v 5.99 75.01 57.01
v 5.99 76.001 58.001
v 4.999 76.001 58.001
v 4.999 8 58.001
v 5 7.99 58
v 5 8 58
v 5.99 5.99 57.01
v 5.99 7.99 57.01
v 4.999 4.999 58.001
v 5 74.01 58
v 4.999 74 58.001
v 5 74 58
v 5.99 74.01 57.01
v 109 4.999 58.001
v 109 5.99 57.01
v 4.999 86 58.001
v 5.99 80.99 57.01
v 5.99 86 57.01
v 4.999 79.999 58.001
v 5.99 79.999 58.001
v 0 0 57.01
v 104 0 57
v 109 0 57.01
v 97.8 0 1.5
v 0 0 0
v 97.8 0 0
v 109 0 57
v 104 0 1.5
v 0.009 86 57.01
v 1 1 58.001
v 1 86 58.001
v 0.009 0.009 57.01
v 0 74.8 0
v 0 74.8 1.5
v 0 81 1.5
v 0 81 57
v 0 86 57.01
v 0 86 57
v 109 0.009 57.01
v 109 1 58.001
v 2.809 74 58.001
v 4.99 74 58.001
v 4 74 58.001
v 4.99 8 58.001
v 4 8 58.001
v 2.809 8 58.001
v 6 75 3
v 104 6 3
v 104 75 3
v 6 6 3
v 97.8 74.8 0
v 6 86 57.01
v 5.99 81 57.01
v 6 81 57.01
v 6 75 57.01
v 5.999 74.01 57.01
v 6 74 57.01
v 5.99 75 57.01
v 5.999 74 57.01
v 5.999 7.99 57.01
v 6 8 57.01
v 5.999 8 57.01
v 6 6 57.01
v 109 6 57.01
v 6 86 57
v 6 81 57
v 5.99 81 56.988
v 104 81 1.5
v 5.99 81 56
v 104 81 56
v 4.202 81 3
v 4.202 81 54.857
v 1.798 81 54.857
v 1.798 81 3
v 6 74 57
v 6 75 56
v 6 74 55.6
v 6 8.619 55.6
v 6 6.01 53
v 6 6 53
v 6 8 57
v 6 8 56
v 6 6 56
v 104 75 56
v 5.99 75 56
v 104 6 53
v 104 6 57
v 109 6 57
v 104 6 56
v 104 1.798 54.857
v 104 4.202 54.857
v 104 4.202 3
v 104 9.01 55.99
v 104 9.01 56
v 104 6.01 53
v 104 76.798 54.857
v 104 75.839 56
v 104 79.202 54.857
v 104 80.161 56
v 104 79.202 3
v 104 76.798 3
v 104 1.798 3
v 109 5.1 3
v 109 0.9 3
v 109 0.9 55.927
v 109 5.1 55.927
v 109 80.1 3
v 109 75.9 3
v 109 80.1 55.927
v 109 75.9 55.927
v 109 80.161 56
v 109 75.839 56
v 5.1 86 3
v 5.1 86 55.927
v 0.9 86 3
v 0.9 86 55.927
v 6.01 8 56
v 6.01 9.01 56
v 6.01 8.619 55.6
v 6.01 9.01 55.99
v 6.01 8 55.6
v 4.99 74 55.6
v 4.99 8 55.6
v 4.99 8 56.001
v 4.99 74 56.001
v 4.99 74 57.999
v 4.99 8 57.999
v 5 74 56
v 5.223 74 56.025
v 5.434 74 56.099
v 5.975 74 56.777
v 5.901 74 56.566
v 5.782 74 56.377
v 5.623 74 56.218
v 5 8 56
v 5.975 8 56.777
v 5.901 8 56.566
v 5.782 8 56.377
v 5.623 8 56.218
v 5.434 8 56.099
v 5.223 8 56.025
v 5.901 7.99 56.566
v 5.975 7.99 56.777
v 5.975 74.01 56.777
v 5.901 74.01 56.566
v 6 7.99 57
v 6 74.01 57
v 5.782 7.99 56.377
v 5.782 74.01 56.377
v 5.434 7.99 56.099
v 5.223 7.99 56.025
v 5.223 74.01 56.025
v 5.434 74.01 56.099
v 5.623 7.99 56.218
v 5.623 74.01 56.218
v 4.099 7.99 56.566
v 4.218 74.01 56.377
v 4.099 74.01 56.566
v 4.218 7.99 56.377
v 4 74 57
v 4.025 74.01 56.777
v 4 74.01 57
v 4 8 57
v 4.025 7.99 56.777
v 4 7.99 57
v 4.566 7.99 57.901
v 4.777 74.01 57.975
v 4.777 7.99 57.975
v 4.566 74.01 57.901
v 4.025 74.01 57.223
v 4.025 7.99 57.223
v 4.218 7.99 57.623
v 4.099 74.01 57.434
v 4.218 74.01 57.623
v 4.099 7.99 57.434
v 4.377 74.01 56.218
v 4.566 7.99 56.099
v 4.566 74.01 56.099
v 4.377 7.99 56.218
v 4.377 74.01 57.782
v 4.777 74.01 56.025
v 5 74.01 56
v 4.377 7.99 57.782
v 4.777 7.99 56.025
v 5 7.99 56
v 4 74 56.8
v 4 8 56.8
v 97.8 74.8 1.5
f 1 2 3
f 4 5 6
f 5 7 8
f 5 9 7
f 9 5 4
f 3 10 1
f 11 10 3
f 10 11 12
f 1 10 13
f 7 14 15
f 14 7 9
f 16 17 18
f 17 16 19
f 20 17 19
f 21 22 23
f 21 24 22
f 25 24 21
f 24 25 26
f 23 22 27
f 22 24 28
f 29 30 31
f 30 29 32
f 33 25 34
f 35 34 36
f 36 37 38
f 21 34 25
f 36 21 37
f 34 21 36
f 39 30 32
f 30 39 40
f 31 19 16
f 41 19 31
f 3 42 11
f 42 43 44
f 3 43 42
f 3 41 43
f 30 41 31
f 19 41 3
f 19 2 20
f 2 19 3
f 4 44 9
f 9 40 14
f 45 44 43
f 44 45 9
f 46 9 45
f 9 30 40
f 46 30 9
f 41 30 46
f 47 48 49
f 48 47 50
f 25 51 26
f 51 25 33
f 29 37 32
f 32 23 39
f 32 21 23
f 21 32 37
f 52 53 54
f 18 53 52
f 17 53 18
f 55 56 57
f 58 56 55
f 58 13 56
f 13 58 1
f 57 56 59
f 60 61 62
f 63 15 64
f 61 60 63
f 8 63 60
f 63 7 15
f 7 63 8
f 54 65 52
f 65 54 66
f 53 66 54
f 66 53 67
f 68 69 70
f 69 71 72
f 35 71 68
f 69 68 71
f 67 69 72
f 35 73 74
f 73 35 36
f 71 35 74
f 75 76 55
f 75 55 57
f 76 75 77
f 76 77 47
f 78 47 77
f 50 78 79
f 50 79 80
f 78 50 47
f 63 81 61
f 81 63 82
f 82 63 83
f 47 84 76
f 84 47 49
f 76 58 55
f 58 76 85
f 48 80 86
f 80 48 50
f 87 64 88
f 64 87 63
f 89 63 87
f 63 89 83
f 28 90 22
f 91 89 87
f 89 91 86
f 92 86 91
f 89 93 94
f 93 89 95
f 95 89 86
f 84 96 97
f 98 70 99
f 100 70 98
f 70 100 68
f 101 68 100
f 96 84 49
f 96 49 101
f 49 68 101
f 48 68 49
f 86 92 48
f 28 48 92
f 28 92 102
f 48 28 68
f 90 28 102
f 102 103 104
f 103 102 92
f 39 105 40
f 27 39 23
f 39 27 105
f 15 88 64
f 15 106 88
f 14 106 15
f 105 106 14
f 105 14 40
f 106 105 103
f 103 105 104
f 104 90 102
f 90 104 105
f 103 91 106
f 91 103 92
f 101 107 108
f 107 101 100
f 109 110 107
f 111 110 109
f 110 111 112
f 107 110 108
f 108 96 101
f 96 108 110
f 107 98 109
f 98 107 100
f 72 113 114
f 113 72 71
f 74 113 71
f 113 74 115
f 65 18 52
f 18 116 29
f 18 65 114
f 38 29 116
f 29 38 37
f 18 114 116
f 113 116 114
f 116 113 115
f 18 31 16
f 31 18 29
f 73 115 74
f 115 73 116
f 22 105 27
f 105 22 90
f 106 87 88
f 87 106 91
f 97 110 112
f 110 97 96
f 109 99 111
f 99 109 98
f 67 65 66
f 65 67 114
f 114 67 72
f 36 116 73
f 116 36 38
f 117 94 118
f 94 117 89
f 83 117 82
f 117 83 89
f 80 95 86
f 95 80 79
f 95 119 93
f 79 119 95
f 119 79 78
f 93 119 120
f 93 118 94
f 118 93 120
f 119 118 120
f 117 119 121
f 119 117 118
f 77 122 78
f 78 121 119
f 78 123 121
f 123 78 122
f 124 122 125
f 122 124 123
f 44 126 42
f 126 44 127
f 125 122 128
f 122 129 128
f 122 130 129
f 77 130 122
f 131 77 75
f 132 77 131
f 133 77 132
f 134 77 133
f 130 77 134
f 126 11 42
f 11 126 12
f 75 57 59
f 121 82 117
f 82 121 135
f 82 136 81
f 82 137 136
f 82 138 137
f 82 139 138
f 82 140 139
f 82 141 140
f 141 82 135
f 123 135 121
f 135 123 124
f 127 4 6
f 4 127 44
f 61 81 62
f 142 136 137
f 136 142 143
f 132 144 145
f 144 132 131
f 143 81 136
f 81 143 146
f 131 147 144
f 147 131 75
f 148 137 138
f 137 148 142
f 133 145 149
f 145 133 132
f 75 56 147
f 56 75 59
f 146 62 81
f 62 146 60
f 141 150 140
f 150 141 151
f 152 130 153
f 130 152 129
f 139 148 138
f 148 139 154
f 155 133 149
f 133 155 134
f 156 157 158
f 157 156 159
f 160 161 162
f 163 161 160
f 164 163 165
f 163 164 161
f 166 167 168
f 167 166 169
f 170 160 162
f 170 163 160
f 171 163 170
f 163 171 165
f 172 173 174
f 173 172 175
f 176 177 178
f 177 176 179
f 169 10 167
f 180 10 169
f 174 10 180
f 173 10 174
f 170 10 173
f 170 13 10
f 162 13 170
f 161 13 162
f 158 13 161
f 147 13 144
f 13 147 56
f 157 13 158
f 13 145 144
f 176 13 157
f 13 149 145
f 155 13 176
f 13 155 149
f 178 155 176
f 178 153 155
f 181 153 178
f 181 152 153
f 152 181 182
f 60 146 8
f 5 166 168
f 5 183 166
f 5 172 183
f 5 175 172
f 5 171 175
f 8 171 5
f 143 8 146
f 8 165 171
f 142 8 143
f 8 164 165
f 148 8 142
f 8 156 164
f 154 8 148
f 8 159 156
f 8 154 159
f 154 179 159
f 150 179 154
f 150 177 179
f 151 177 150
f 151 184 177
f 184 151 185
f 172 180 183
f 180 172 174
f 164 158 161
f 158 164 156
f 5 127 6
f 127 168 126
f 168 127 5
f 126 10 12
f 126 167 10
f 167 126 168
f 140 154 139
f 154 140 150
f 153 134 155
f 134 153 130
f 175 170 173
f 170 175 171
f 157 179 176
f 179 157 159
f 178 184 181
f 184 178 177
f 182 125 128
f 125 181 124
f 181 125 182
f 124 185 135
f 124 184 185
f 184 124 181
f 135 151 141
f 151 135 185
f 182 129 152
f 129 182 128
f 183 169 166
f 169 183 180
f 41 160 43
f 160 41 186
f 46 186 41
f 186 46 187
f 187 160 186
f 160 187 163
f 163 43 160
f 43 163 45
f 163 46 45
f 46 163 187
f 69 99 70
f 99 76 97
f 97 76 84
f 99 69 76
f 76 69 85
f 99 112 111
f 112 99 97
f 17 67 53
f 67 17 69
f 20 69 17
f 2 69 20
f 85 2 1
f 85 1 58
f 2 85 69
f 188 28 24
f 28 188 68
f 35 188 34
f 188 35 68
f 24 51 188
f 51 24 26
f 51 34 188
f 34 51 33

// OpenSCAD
// ============================================================================
// cutlery_box.scad
// Graduated 3-chamber disposable-cutlery box (Option 3) — CUT-FROM-SOLID port
// of build_box.py, for a 120 x 120 x 120 mm printer (AOSEED).
//
// WHY THIS PORT EXISTS (the whole point):
//   The hand-mesh generator (build_box.py) could not keep the 1 mm rim chamfer
//   continuous across the female dovetail joints, because where a slot's flared
//   corner crosses the sloped chamfer it needs a true boolean intersection.
//   OpenSCAD HAS that boolean kernel, so here we do exactly the "cut-from-solid"
//   thing:
//      1. Build the ENTIRE box as ONE solid, WITH the chamfer already on it.
//      2. difference() out vertical dovetail prisms ( /_\ cross-section ),
//         running from just above the base plate up THROUGH the rim, to both
//         (a) form the sliding-dovetail joints, and
//         (b) split the box into 6 bed-sized pieces.
//   Because the cut is a real boolean through the already-chamfered solid, the
//   sloped chamfer<->slot edge is produced for free => the rim chamfer stays
//   CONTINUOUS across every joint, with none of the sliver hacks.
//
// ----------------------------------------------------------------------------
// HOW TO USE
//   In the app:  set `part` below (or use the Customizer dropdown), F5 to
//                preview, F6 to render, then File > Export > STL.
//   One piece (CLI):
//      openscad -o body_knife_A.stl -D 'part="knife_A"' cutlery_box.scad
//   ALL SIX (bash, run from this folder):
//      for p in knife_A knife_B fork_A fork_B spoon_A spoon_B; do \
//        openscad -o "body_$p.stl" -D "part=\"$p\"" cutlery_box.scad ; done
//   PNG preview of one piece:
//      openscad -o knife_B.png --imgsize=1400,1000 --autocenter --viewall \
//        -D 'part="knife_B"' cutlery_box.scad
//
//   Pieces are modelled in ASSEMBLED coordinates (floor-down, z=0 is the bed),
//   so importing all six STLs together shows the assembled box directly; your
//   slicer will auto-drop each one onto the plate for printing.
//
// BED SANITY: every piece is <= 120 mm in X, Y, Z.
//   Z = 58 mm. Widest piece = spoon at 117 mm (Y). A-halves reach 109 mm (X,
//   including the protruding dovetail key). All under 120.
//
// !! I could NOT run OpenSCAD to verify this file (no binary in my sandbox) !!
//   - The rim chamfer is a SMOOTH, true-45 bevel built from hull() frustums of
//     convex rectangles. Works in every OpenSCAD since ~2015 (incl. Homebrew
//     2021.01). No stepped staircase -- and, crucially, it makes box() a clean
//     well-formed solid so the per-part booleans resolve reliably (the old
//     14-slice staircase was fragile and CGAL was dropping the walls of the
//     interior parts, leaving only the key prisms => "floating boxes").
//   - roof() is still available behind USE_ROOF=true for those who have it
//     (2021.01+ snapshots); for THIS rectangular design it is identical, so it
//     is NOT required.
//   - After F6, check the console for "WARNING"/"not a valid 2-manifold".
//     If a tenon ever looks detached, bump EPS to 0.05.
// ============================================================================


/* [Part to render / export] */
part = "knife_A"; // [knife_A, knife_B, fork_A, fork_B, spoon_A, spoon_B, assembly]

/* [Chamfer method] */
// false = smooth hull() frustum bevel (default, any OpenSCAD); true = roof() (2021.01+)
USE_ROOF = false;

/* [Heights (mm)] */
BASE   = 3.0;     // floor / base-plate thickness
COMP_H = 55.0;    // interior wall height above the floor (cutlery stack depth)

/* [Walls (mm)] */
HOST_T   = 6.0;     // thickness of every wall (thick enough to host a dovetail)
HALF_LEN = 104.0;   // printed length of each half (A = near, B = far); <120 incl. key

/* [Chamber bays (mm)] */
N_COL     = 3;       // columns of cutlery per chamber
KNIFE_COL = 23.0;    // -> knife bay 69  (3 x 19 mm knives + play)
FORK_COL  = 33.0;    // -> fork  bay 99  (3 x 29 mm forks  + play)
SPOON_COL = 37.0;    // -> spoon bay 111 (3 x 34 mm spoons + play, trimmed <120)

/* [Dovetail joint (mm)] */
DT_DEPTH = 5.0;   // tail protrusion past the seam (male key depth)
DT_NECK  = 1.2;   // half-width at the seam face (narrow)
DT_FLARE = 2.1;   // half-width at the tip (wide -> locks)
DT_CLR   = 0.4;   // FLANK/seam slide clearance added to the female socket (do not change for fit)
DT_DEPTH_RELIEF = 0.3; // extra depth on the socket BACK only, so the tail tip never bottoms out

/* [Hidden-dovetail top cap / "hat" (mm)] */
// The dovetail otherwise shows its trapezoid outline on the TOP edge of the wall.
// To hide it, the MALE piece extends the wall's full-width top (chamfer included)
// across the key footprint -> a flush, continuous top. The FEMALE piece gets a
// matching top RECESS (cap footprint + CAP_CLR) so the cap drops straight in.
// Result: the top reads as one surface with a single straight seam line at the cap
// tip; the dovetail joinery lives entirely below the cap.
//
// SELF-SUPPORTING UNDERSIDE: the cap reaches the FULL wall width at the chamfer base
// (so the top edge reads as the wall extended, with NO recessed sliver on the outer
// face), and its underside is ONE planar ramp from the chamfer's OUTER CORNER
// (half-width HOST_T/2 at z = BODY_H-CHAMFER) down to the dovetail-neck half-width
// (CAP_FOOT) at CAP_SLANT_DEG from horizontal. No little horizontal step. The ramp
// reaching full width exactly at the chamfer base means "ramp top" == "chamfer base"
// (CAP_H is DERIVED). The FEMALE recess is the same ramp + CAP_CLR play.
// TRADEOFF: because the cap runs all the way to the outer corner, the female wall
// tapers to ~0 at z = BODY_H-CHAMFER -> a thin feather edge at the joint (gradual at
// CAP_SLANT_DEG, hidden inside the joint when assembled). Accepted per design intent.
CAP_SLANT_DEG = 50;     // cap underside ramp angle from horizontal (50 = self-supporting, long flare)
CAP_FOOT = DT_NECK;     // cap-underside half-width where it meets the dovetail neck
CAP_CLR = 0.3;          // slide clearance so the male cap seats into the female top recess

/* [Rim chamfer (mm)] */
CHAMFER = 1.0;    // 45-deg comfort break broken along the top wall edges

/* [Base half-lap / anti-warp (mm)] */
// Neighbouring base plates overlap as a HORIZONTAL half-lap (shiplap) at mid-base
// height, so corners stay coplanar (no lift/protrusion). Horizontal lap faces do
// NOT bind the vertical-drop assembly. Shingle direction: A->B and knife->fork->spoon.
LAP_LEN = 6;        // overlap past the A/B seam and the knife/fork seam
LAP_LEN_FS = 2;     // overlap past the fork/SPOON seam -- SMALLER: spoon is the
                    // tightest piece (117mm of the 120mm bed); a 6mm lap there
                    // would push spoon to 123mm. 2mm keeps spoon at 119mm.
LAP_Z   = BASE/2;   // 1.5 -- horizontal split height of the lap (bottom vs top half)
LAP_CLR = 0.2;      // in-plane clearance so the shelf isn't a press fit

/* [Lid — box features that receive a flat ORDERED clear sheet] */
// The lid itself is NOT printed: it's a flat ~2 mm PETG/Tritan sheet, bullnose-polished
// edges (r=LID_EDGE_R), ordered to size. We only model the box features that receive it.
LID_T            = 2.0;   // ordered sheet thickness
LID_EDGE_R       = 1.0;   // ordered sheet bullnose edge radius (for the sheet order spec)
LID_PLAY         = 0.4;   // total vertical play in the hinge groove (sheet + this)
HINGE_AT_MINUS_X = true;  // hinge on the -x (303mm) end wall; clip on +x. (flip = mirror; default delivered)
// perimeter support ledge (lid underside rests on it at z = BODY_H-LID_T)
LEDGE_W          = 3.0;   // ledge inward protrusion (its underside ramps back at 45 deg -> self-supporting)
// hinge groove (cut into the inner face of the hinge end wall, segmented per chamber)
GROOVE_DEPTH     = 2.0;   // total depth into the wall (1.0 straight lead-in + 1.0 pocket radius)
GROOVE_POCKET_R  = 1.0;   // journal half-cylinder radius (the bullnose sheet edge rolls in it)
GROOVE_MOUTH_EASE= 1.2;   // 45 deg ease on the slot's inner-top lip so the sheet swings up & lifts out
// clip latch (one localized retainer, centered on the clip end wall)
CLIP_W           = 18.0;  // clip width
CLIP_LIP         = 0.4;   // retaining overhang (0.3 light .. 0.6 firm)
CLIP_RAMP_H      = 1.6;   // cam-ramp height above the rim (press-to-close)
// finger scallop (semicircular dish in the rim, centered on & aligned with the clip)
SCALLOP_W        = 16.0;  // scallop width
SCALLOP_DEPTH    = 6.0;   // how far it dishes down from the rim


/* [Hidden] */
EPS      = 0.01;          // tiny overlap so abutting solids fuse cleanly in CGAL
// Upper-chamber pieces (fork, spoon) were cut by a cell plane laid EXACTLY on the
// divider wall's far face (the lower chamber owns that wall). intersection() along a
// plane coincident with an existing box face makes CGAL leave a ZERO-THICKNESS copy
// of the wall face -> edge-manifold + "watertight" but degenerate (OpenSCAD shows it
// as a blue back-face; Tinkercad thickens it into a phantom block). SEAM_EPS nudges
// those cut planes a hair INTO the open bay so they no longer coincide with any box
// face -> no flap. 0.02 mm is physically nothing but is well clear of CGAL's tolerance.
SEAM_EPS = 0.02;
CUT_OVER = 1.0;           // how far dovetail cutters overshoot the rim (clean cut)

BODY_H    = BASE + COMP_H;     // 58  total height
END_WALL  = HOST_T;            // end walls are dovetail hosts too -> equally thick
TOTAL_LEN = 2 * HALF_LEN;      // 208 assembled length (end wall .. end wall)

// hidden-cap ramp geometry (derived).
//   CAP_HW    = cap MAX half-width = HOST_T/2 (the full wall edge) at the chamfer base.
//   CAP_RISE  = vertical height of the self-supporting CAP_SLANT_DEG underside ramp.
//   CAP_ZRAMP = where the cap reaches full width = the chamfer base (BODY_H-CHAMFER), so
//               the ramp runs straight to the chamfer OUTER CORNER (no horizontal step).
//   CAP_ZBOT  = cap bottom = ramp start; CAP_H derived from it (for reference/report).
//   CAP_ZRAMP_R = recess ramp top, shifted down by CAP_CLR so the recess ramp stays
//               parallel to the cap ramp with uniform play.
CAP_HW      = HOST_T/2;   // cap reaches the FULL wall edge at the chamfer base
CAP_RISE    = (CAP_HW - CAP_FOOT) * tan(CAP_SLANT_DEG);
CAP_ZRAMP   = BODY_H - CHAMFER;               // full width exactly at the chamfer base / outer corner
CAP_ZBOT    = CAP_ZRAMP - CAP_RISE;
CAP_H       = BODY_H - CAP_ZBOT;              // derived; reported
CAP_ZRAMP_R = CAP_ZRAMP;   // recess ramp ALSO tops at the chamfer corner (mirror the cap) -> no vertical lip
// sanity checks
assert(CAP_ZBOT > BASE + 1,
       "cap zone dips too low -- raise CAP_SLANT_DEG");
assert(CAP_HW >= DT_FLARE,
       "cap too narrow to cover the dovetail tail");

// NOTE: lid-derived constants are defined BELOW the Y-layout block, because some of
// them (INTERIOR_Y0/Y1, CLIP_CY) depend on OUTER_L / OUTER_R / EXT_W. See "lid derived".

// bay widths
KNIFE_BAY = N_COL * KNIFE_COL; // 69
FORK_BAY  = N_COL * FORK_COL;  // 99
SPOON_BAY = N_COL * SPOON_COL; // 111

// ---- Y layout (width direction): wall | bay | divider | bay | divider | bay | wall
KNIFE_Y0 = 0;
KNIFE_Y1 = HOST_T + KNIFE_BAY + HOST_T;        // 0..81   (outer wall + bay + divider)
FORK_Y0  = KNIFE_Y1;                           // 81
FORK_Y1  = FORK_Y0 + FORK_BAY + HOST_T;        // 81..186 (bay + divider)
SPOON_Y0 = FORK_Y1;                            // 186
SPOON_Y1 = SPOON_Y0 + SPOON_BAY + HOST_T;      // 186..303(bay + outer wall)
EXT_W    = SPOON_Y1;                           // 303 total width

// lengthwise wall Y-bands [y0,y1] (host the A/B dovetails) + their centers
OUTER_L  = [0, HOST_T];                                       // [0,6]    c=3
DIV_KF   = [HOST_T + KNIFE_BAY, HOST_T + KNIFE_BAY + HOST_T]; // [75,81]  c=78
DIV_FS   = [FORK_Y0 + FORK_BAY, FORK_Y0 + FORK_BAY + HOST_T]; // [180,186]c=183
OUTER_R  = [SPOON_Y1 - HOST_T, SPOON_Y1];                     // [297,303]c=300

// ---- lid derived ---- (placed AFTER OUTER_L/OUTER_R/EXT_W so nothing is forward-referenced)
LID_Z_UNDER = BODY_H - LID_T;             // 56  lid underside / ledge top / lowered-divider top
GROOVE_Z0   = BODY_H - (LID_T + LID_PLAY);// 55.6 groove bottom (top is the rim z=BODY_H, open to drop in)
POCKET_CZ   = BODY_H - LID_T/2;           // 57  journal pocket centre (sheet mid-thickness)
// hinge end-wall inner face x + inward direction; clip end-wall inner face x + inward dir
HINGE_INX   = HINGE_AT_MINUS_X ? END_WALL : TOTAL_LEN - END_WALL;       // 6  (default)
HINGE_IN    = HINGE_AT_MINUS_X ? 1 : -1;  // interior direction from the hinge wall (+x default)
CLIP_INX    = HINGE_AT_MINUS_X ? TOTAL_LEN - END_WALL : END_WALL;       // 202 (default)
CLIP_IN     = HINGE_AT_MINUS_X ? -1 : 1;  // interior direction from the clip wall (-x default)
POCKET_CX   = HINGE_INX - HINGE_IN*(GROOVE_DEPTH - GROOVE_POCKET_R);    // 5  pocket centre x (INTO the wall)
INTERIOR_Y0 = OUTER_L[1];                 // 6   inner face of the -y short wall
INTERIOR_Y1 = OUTER_R[0];                 // 297 inner face of the +y short wall
CLIP_CY     = EXT_W/2;                     // 151.5 clip/scallop centre (in the fork chamber)
assert(LID_Z_UNDER > CAP_ZBOT,
       "lid underside below the cap foot -- check LID_T vs cap geometry");

// the three OPEN bays are rectangular holes in the wall footprint:
//   footprint = outer rectangle MINUS these bays  (== the 6 walls; verified).
// The smooth chamfer is built from exactly this decomposition.
BAY_X0 = END_WALL;              // 6
BAY_X1 = TOTAL_LEN - END_WALL;  // 202
BAYS = [
    [BAY_X0, BAY_X1, HOST_T,   HOST_T + KNIFE_BAY],   // knife bay [6,202] x [6,75]
    [BAY_X0, BAY_X1, FORK_Y0,  FORK_Y0 + FORK_BAY],   // fork  bay [6,202] x [81,180]
    [BAY_X0, BAY_X1, SPOON_Y0, SPOON_Y0 + SPOON_BAY], // spoon bay [6,202] x [186,297]
];

YC_OUTL  = OUTER_L[0] + HOST_T/2;   // 3   outer-left wall center
YC_DIVKF = DIV_KF[0]  + HOST_T/2;   // 78  knife/fork divider center
YC_DIVFS = DIV_FS[0]  + HOST_T/2;   // 183 fork/spoon divider center
YC_OUTR  = OUTER_R[0] + HOST_T/2;   // 300 outer-right wall center

// seams
AB_SEAM = HALF_LEN;               // 104  A/B length seam (x)
SEAM_KF = FORK_Y0;                // 81   knife/fork width seam (y)
SEAM_FS = SPOON_Y0;              // 186  fork/spoon width seam (y)
ENDC_A  = END_WALL/2;             // 3    A end-wall center (x) -> chamber dovetails
ENDC_B  = TOTAL_LEN - END_WALL/2; // 205  B end-wall center (x)


// ============================================================================
// 2D wall footprint (cross-section of all walls, constant in z for the straight
// part). Union of: 2 full-width end walls + 4 lengthwise walls between them.
// ============================================================================
module wall_footprint_2d() {
    // footprint = outer rectangle minus the 3 open bays  (== the 6 walls)
    difference() {
        square([TOTAL_LEN, EXT_W]);
        for (b = BAYS) translate([b[0], b[2]]) square([b[1] - b[0], b[3] - b[2]]);
    }
}

// ============================================================================
// The full chamfered box solid = base plate + walls with a continuous 1 mm
// top-rim chamfer. Built ONCE; every piece is carved out of this.
// ============================================================================
module chamfer_cap() {
    // SMOOTH 45 rim chamfer over z[BODY_H-CHAMFER, BODY_H], in absolute coords.
    zm = BODY_H - CHAMFER;
    if (USE_ROOF) {
        // exact straight-skeleton roof, capped at CHAMFER height (needs roof()).
        intersection() {
            translate([0,0,zm]) roof() wall_footprint_2d();
            translate([0,0,zm]) linear_extrude(CHAMFER + EPS) wall_footprint_2d();
        }
    } else {
        // DEFAULT: true 45 bevel as hull() frustums of CONVEX rectangles -> smooth
        // AND a clean manifold.  Since footprint = outer - bays, the chamfer of the
        // footprint = (outer rectangle beveled inward) MINUS (each bay beveled so it
        // grows toward the top, which bevels every bay-facing rim).  All hull()s are
        // on convex rectangles, so nothing gets convex-filled.
        difference() {
            // outer perimeter frustum: full outer rect at zm -> inset by CHAMFER at top
            hull() {
                translate([0,0,zm])     linear_extrude(0.001) square([TOTAL_LEN, EXT_W]);
                translate([0,0,BODY_H]) linear_extrude(0.001) offset(delta=-CHAMFER) square([TOTAL_LEN, EXT_W]);
            }
            // each bay grows by CHAMFER toward the top -> bevels its surrounding rim.
            // (overshoots z a hair past both ends so the cut is clean.)
            for (b = BAYS)
                hull() {
                    translate([0,0,zm-EPS])     linear_extrude(0.001)
                        translate([b[0],b[2]]) offset(delta=-EPS)        square([b[1]-b[0], b[3]-b[2]]);
                    translate([0,0,BODY_H+EPS]) linear_extrude(0.001)
                        translate([b[0],b[2]]) offset(delta=CHAMFER+EPS) square([b[1]-b[0], b[3]-b[2]]);
                }
        }
    }
}

module box() {
    zm = BODY_H - CHAMFER;
    union() {
        cube([TOTAL_LEN, EXT_W, BASE]);                                        // base plate z[0,3]
        translate([0,0,BASE]) linear_extrude(zm - BASE + EPS) wall_footprint_2d(); // straight walls z[3,57]
        chamfer_cap();                                                         // smooth chamfer z[57,58]
    }
}

// ============================================================================
// Dovetail prisms ( /_\ ). Vertical, z[BASE, BODY_H+CUT_OVER] so they cut
// through the rim but leave the base plate continuous. The near face is pushed
// back EPS so a male key always fuses to its wall.
//   male key   : half_n=DT_NECK,         half_f=DT_FLARE
//   female slot: half_n=DT_NECK+DT_CLR,  half_f=DT_FLARE+DT_CLR
// ============================================================================
module dt_prism_X(seam_x, yc, half_n, half_f) {   // perpendicular to X, grows +X
    translate([0,0,BASE]) linear_extrude(BODY_H - BASE + CUT_OVER)
        polygon([[seam_x - EPS,        yc - half_n],
                 [seam_x + DT_DEPTH,   yc - half_f],
                 [seam_x + DT_DEPTH,   yc + half_f],
                 [seam_x - EPS,        yc + half_n]]);
}
module dt_prism_Y(seam_y, xc, half_n, half_f) {   // perpendicular to Y, grows +Y
    translate([0,0,BASE]) linear_extrude(BODY_H - BASE + CUT_OVER)
        polygon([[xc - half_n, seam_y - EPS],
                 [xc - half_f, seam_y + DT_DEPTH],
                 [xc + half_f, seam_y + DT_DEPTH],
                 [xc + half_n, seam_y - EPS]]);
}
module ab_key   (yc)        { dt_prism_X(AB_SEAM, yc, DT_NECK, DT_FLARE); }
module ch_key   (seam_y, xc){ dt_prism_Y(seam_y, xc, DT_NECK, DT_FLARE); }

// Female sockets = male + DT_CLR on the flanks/seam (unchanged), PLUS a straight
// back-face relief of DT_DEPTH_RELIEF so the tail tip never bottoms out. The
// relief is a rectangle tacked onto the trapezoid's tip at the SAME flare width,
// so the angled flank faces (and their 0.4 mm slide clearance) are untouched.
module ab_socket(yc) {
    dt_prism_X(AB_SEAM, yc, DT_NECK + DT_CLR, DT_FLARE + DT_CLR);
    translate([0,0,BASE]) linear_extrude(BODY_H - BASE + CUT_OVER)
        translate([AB_SEAM + DT_DEPTH, yc - (DT_FLARE + DT_CLR)])
            square([DT_DEPTH_RELIEF, 2*(DT_FLARE + DT_CLR)]);          // back relief, +X
}
module ch_socket(seam_y, xc) {
    dt_prism_Y(seam_y, xc, DT_NECK + DT_CLR, DT_FLARE + DT_CLR);
    translate([0,0,BASE]) linear_extrude(BODY_H - BASE + CUT_OVER)
        translate([xc - (DT_FLARE + DT_CLR), seam_y + DT_DEPTH])
            square([2*(DT_FLARE + DT_CLR), DT_DEPTH_RELIEF]);          // back relief, +Y
}

// ===== hidden-dovetail top cap ("hat"), SELF-SUPPORTING underside ===============
// MALE cap: a FULL-wall-width hat whose underside is ONE planar ramp from the chamfer's
// OUTER CORNER (half-width CAP_HW = HOST_T/2 at CAP_ZRAMP = BODY_H-CHAMFER) down to the
// dovetail-neck half-width (CAP_FOOT) at CAP_SLANT_DEG from horizontal -> the self-
// supporting shoulder, running straight to the corner (no horizontal step). Built as
// hull(narrow bottom slab buried in the tail neck, full-width top slab through the rim);
// box() trims it to the wall and adds the continuous rim chamfer for free, so the outer
// top edge reads as the wall extended (no recessed sliver). The protruding NOSE is left
// SQUARE (vertical) -- hidden in the female socket when assembled.
// TRADEOFF: the female wall tapers to ~0 at z=BODY_H-CHAMFER (a thin feather edge at the
// joint, gradual at CAP_SLANT_DEG) -- accepted per design intent.
module ab_cap(yc) {   // A/B seam, grows +X past the seam (length direction)
    hull() {
        translate([AB_SEAM - EPS, yc - CAP_FOOT, CAP_ZBOT])
            cube([DT_DEPTH + EPS, 2*CAP_FOOT, EPS]);
        translate([AB_SEAM - EPS, yc - CAP_HW,   CAP_ZRAMP])
            cube([DT_DEPTH + EPS, 2*CAP_HW, (BODY_H + CUT_OVER) - CAP_ZRAMP]);
    }
}
module ch_cap(seam_y, xc) {   // chamber seam, grows +Y past the seam (in the end wall)
    hull() {
        translate([xc - CAP_FOOT, seam_y - EPS, CAP_ZBOT])
            cube([2*CAP_FOOT, DT_DEPTH + EPS, EPS]);
        translate([xc - CAP_HW,   seam_y - EPS, CAP_ZRAMP])
            cube([2*CAP_HW, DT_DEPTH + EPS, (BODY_H + CUT_OVER) - CAP_ZRAMP]);
    }
}
// FEMALE recess: the SAME ramp grown by CAP_CLR (flanks, tip, floor, and ramp shifted down
// by CAP_CLR so it stays parallel) -> the cap seats with uniform slide clearance. It opens
// to the wall edge (and a hair past, into air) so the cap's full-width corner drops in;
// this is what leaves the thin female feather at the top (accepted). Open upward + toward seam.
module ab_cap_neg(yc) {
    hull() {
        translate([AB_SEAM - EPS, yc - (CAP_FOOT + CAP_CLR), CAP_ZBOT - CAP_CLR])
            cube([DT_DEPTH + CAP_CLR + EPS, 2*(CAP_FOOT + CAP_CLR), EPS]);
        translate([AB_SEAM - EPS, yc - (CAP_HW + EPS), CAP_ZRAMP_R])
            cube([DT_DEPTH + CAP_CLR + EPS, 2*(CAP_HW + EPS), (BODY_H + CUT_OVER + 1) - CAP_ZRAMP_R]);
    }
}
module ch_cap_neg(seam_y, xc) {
    hull() {
        translate([xc - (CAP_FOOT + CAP_CLR), seam_y - EPS, CAP_ZBOT - CAP_CLR])
            cube([2*(CAP_FOOT + CAP_CLR), DT_DEPTH + CAP_CLR + EPS, EPS]);
        translate([xc - (CAP_HW + EPS), seam_y - EPS, CAP_ZRAMP_R])
            cube([2*(CAP_HW + EPS), DT_DEPTH + CAP_CLR + EPS, (BODY_H + CUT_OVER + 1) - CAP_ZRAMP_R]);
    }
}

// rectangular cell (x[xa,xb], y[ya,yb], full height + margin) used to split pieces
module cell(xa, xb, ya, yb) {
    translate([xa, ya, -1]) cube([xb - xa, yb - ya, BODY_H + 11]);
}

// ===== base half-lap (shiplap) =================================================
// HORIZONTAL lap at mid-base height: the shelf-owner keeps its BOTTOM half
// (z 0..LAP_Z) extending LAP_LEN past the seam; the neighbour has its bottom half
// REMOVED there (keeps only the top half) and lands flat on the shelf. Horizontal
// faces => no binding during the vertical drop. Shelves live entirely in the base
// (z < BASE), well clear of the wall dovetails (z >= BASE).
// Shingle = FEMALE-first (matches the no-notch dovetail assembly order, which
// lowers the male piece onto the female): the B half owns the A/B shelf (grows
// -X into A) and the UPPER chamber (fork, spoon) owns the chamber shelf (grows
// -Y into the lower chamber).  Order: spoon, fork, knife; B before A.
module lap_shelf_X(y0, y1) {                 // B-side shelf, grows -X into A past AB_SEAM
    // +EPS past AB_SEAM so the shelf interpenetrates (not just abuts) its own B body -> fuses cleanly.
    translate([AB_SEAM - LAP_LEN, y0, 0]) cube([LAP_LEN + EPS, y1 - y0, LAP_Z]);
}
module lap_neg_X(y0, y1) {                   // A-side: remove bottom half to receive it
    translate([AB_SEAM - LAP_LEN - LAP_CLR, y0 - EPS, -EPS])
        cube([LAP_LEN + LAP_CLR + EPS, (y1 - y0) + 2*EPS, LAP_Z + EPS]);
}
module lap_shelf_Y(seam_y, x0, x1, ln=LAP_LEN) {   // upper-chamber shelf, grows -Y into lower
    // grows -Y by `ln` into the lower chamber AND +Y by 2*SEAM_EPS past the seam so it
    // always overlaps the (SEAM_EPS-nudged) body floor and stays fused -> no floating shelf.
    translate([x0, seam_y - ln, 0]) cube([x1 - x0, ln + 2*SEAM_EPS, LAP_Z]);
}
module lap_neg_Y(seam_y, x0, x1, ln=LAP_LEN) {     // lower-chamber: remove bottom half
    translate([x0 - EPS, seam_y - ln - LAP_CLR, -EPS])
        cube([(x1 - x0) + 2*EPS, ln + LAP_CLR + EPS, LAP_Z + EPS]);
}

// ============================================================================
// LID FEATURES (receive a flat ORDERED clear sheet; the sheet is not printed).
// All features live at the TOP (z >= ~52), ABOVE the dovetail engagement, the half-lap
// (z<1.5) and most of the hat, so the vertical-drop assembly and joints are untouched.
// EPS overlaps throughout; no coincident coplanar faces with the existing walls.
// Default orientation: HINGE on the -x end wall (A pieces), CLIP on the +x end wall
// (B pieces), clip+scallop centred on the fork (middle) chamber.
// ============================================================================

// --- perimeter support ledge: 45-deg self-supporting brackets; rest face at LID_Z_UNDER.
//     Runs along the CLIP end wall + the two short outer walls. (Hinge wall uses the groove.)
//     Built as hull(thin top edge, wall column) -> a triangular bracket whose underside is
//     a 45-deg ramp (prints floor-down with no support). ADDED to each piece (clipped by cell).
module lid_ledge() {
    // clip end wall (x = CLIP_INX), bracket protrudes toward interior (CLIP_IN)
    hull() {
        translate([CLIP_INX + CLIP_IN*LEDGE_W, INTERIOR_Y0, LID_Z_UNDER - EPS]) cube([EPS, INTERIOR_Y1-INTERIOR_Y0, EPS]);
        translate([CLIP_INX - EPS,             INTERIOR_Y0, LID_Z_UNDER - LEDGE_W]) cube([2*EPS, INTERIOR_Y1-INTERIOR_Y0, LEDGE_W]);
    }
    // OUTER_L short wall (y = INTERIOR_Y0), bracket protrudes +y
    hull() {
        translate([END_WALL, INTERIOR_Y0 + LEDGE_W, LID_Z_UNDER - EPS]) cube([TOTAL_LEN - 2*END_WALL, EPS, EPS]);
        translate([END_WALL, INTERIOR_Y0 - EPS,     LID_Z_UNDER - LEDGE_W]) cube([TOTAL_LEN - 2*END_WALL, 2*EPS, LEDGE_W]);
    }
    // OUTER_R short wall (y = INTERIOR_Y1), bracket protrudes -y
    hull() {
        translate([END_WALL, INTERIOR_Y1 - LEDGE_W, LID_Z_UNDER - EPS]) cube([TOTAL_LEN - 2*END_WALL, EPS, EPS]);
        translate([END_WALL, INTERIOR_Y1 - EPS,     LID_Z_UNDER - LEDGE_W]) cube([TOTAL_LEN - 2*END_WALL, 2*EPS, LEDGE_W]);
    }
}

// --- hinge groove: a straight lead-in slot + a journal half-cylinder pocket + a 45-deg
//     mouth-ease on the wall-top behind the pocket (so the rigid sheet swings up wide and
//     can still lift out). Cut into the inner face of the HINGE end wall. SEGMENTED per
//     chamber so it never crosses the chamber dovetails (at the seams) or the dividers.
//     Slot is open at the rim (z=BODY_H) so the sheet edge drops into the pocket.
module hinge_groove_seg(y0, y1) {
    sx0 = min(POCKET_CX, HINGE_INX);  sx1 = max(POCKET_CX, HINGE_INX);   // straight lead-in span
    translate([sx0 - EPS, y0, GROOVE_Z0]) cube([sx1 - sx0 + 2*EPS, y1 - y0, BODY_H - GROOVE_Z0 + EPS]);
    translate([POCKET_CX, y0 - EPS, POCKET_CZ]) rotate([-90,0,0]) cylinder(h = y1 - y0 + 2*EPS, r = GROOVE_POCKET_R, $fn = 28);
    // mouth ease: 45-deg relief of the wall-top corner behind the pocket
    epx = POCKET_CX - HINGE_IN*GROOVE_POCKET_R;   // pocket back, top corner
    translate([0, y0, 0]) rotate([90,0,0]) translate([0,0,-(y1-y0)]) linear_extrude(y1 - y0)
        polygon([[epx, BODY_H + EPS],
                 [epx - HINGE_IN*GROOVE_MOUTH_EASE, BODY_H + EPS],
                 [epx, BODY_H - GROOVE_MOUTH_EASE]]);
}
module hinge_groove() {
    hinge_groove_seg(INTERIOR_Y0 + 2,           DIV_KF[0] - 1);          // knife chamber
    hinge_groove_seg(SEAM_KF + DT_DEPTH + 2,    DIV_FS[0] - 1);          // fork  chamber
    hinge_groove_seg(SEAM_FS + DT_DEPTH + 2,    INTERIOR_Y1 - 1);        // spoon chamber
}

// --- lower the inner chamber dividers to the lid underside (mid-support, no sag).
//     Removes the divider top over the full length; outer walls keep full height.
module divider_lower() {
    // x-span is the CHAMBER BAY only [BAY_X0, BAY_X1] (+EPS overlap into the end walls so the
    // cut is manifold). The end/outer walls keep their full BODY_H tops; only the two INNER
    // dividers (DIV_KF, DIV_FS) are lowered.
    translate([BAY_X0 - EPS, DIV_KF[0], LID_Z_UNDER]) cube([BAY_X1 - BAY_X0 + 2*EPS, HOST_T, BODY_H - LID_Z_UNDER + CUT_OVER]);
    translate([BAY_X0 - EPS, DIV_FS[0], LID_Z_UNDER]) cube([BAY_X1 - BAY_X0 + 2*EPS, HOST_T, BODY_H - LID_Z_UNDER + CUT_OVER]);
}

// --- retaining clip (ADDED): a cam-ramped lip on the clip end wall, centred on CLIP_CY.
//     Lip underside at the rim (z=BODY_H) overhangs the lid top by CLIP_LIP; ramp above
//     cams the lid under on close. Anchored into the wall (base at +/- HOST_T/2). Added
//     AFTER the scallop cut so the scallop never undercuts it.
module lid_clip() {
    translate([0, CLIP_CY - CLIP_W/2, 0]) rotate([90,0,0]) translate([0,0,-CLIP_W]) linear_extrude(CLIP_W)
        polygon([[CLIP_INX - CLIP_IN*HOST_T/2, BODY_H - EPS],            // base, into the wall (fuse)
                 [CLIP_INX + CLIP_IN*CLIP_LIP, BODY_H],                  // lip tip (overhang over lid)
                 [CLIP_INX + CLIP_IN*CLIP_LIP, BODY_H + 0.6],            // lip front
                 [CLIP_INX - CLIP_IN*HOST_T/2, BODY_H + CLIP_RAMP_H]]);  // ramp top at the wall
}

// --- finger scallop (CUT): a semicircular dish in the rim's INNER edge at the clip, so a
//     fingertip reaches under the lid edge to release it. Interior half only (does not
//     touch the wall body or the clip's anchor).
module lid_scallop() {
    intersection() {
        translate([CLIP_INX, CLIP_CY, BODY_H - SCALLOP_DEPTH]) cylinder(h = SCALLOP_DEPTH + EPS, r = SCALLOP_W/2, $fn = 40);
        translate([CLIP_INX + (CLIP_IN<0 ? -SCALLOP_W : 0), CLIP_CY - SCALLOP_W, BODY_H - SCALLOP_DEPTH - EPS])
            cube([SCALLOP_W, 2*SCALLOP_W, SCALLOP_DEPTH + 2*EPS]);
    }
}

// ============================================================================
// The six pieces.  piece = intersection(box, cell + own male keys) - own sockets
//   A halves are MALE on the A/B seam (keep the key); B halves are FEMALE (slot).
//   On a chamber seam the LEFT chamber is male (+Y), the right chamber is female.
// ============================================================================
// Base half-lap shingling (FEMALE-first, Option 1):
//   A/B seam  -> the B half owns the bottom shelf (grows -X), A has the negative.
//   chamber   -> the UPPER chamber (fork, spoon) owns the shelf (grows -Y); the
//                lower chamber (knife, fork) has the negative.
//   Assembly order: spoon, fork, knife; B before A (male lowered onto female).
// Center crossings (104,81)&(104,186): the CHAMBER shelf (fork_A / spoon_A) owns the
//   crossing square; the B-half A/B shelf (knife_B / fork_B) is CLIPPED short of the
//   chamber seam by LAP_LEN so two shelves never collide.
module knife_A() {                                       // placed LAST; receives everything
    difference() {
        union() {
            intersection() {
                box();
                union() {
                    cell(-1, AB_SEAM, KNIFE_Y0 - 1, KNIFE_Y1);
                    ab_key(YC_OUTL); ab_key(YC_DIVKF); ch_key(SEAM_KF, ENDC_A);
                    ab_cap(YC_OUTL); ab_cap(YC_DIVKF); ch_cap(SEAM_KF, ENDC_A);  // hide tops (male)
                }
            }
            intersection() { lid_ledge(); cell(-1, AB_SEAM, KNIFE_Y0 - 1, KNIFE_Y1); }  // lid support ledge
        }
        lap_neg_X(KNIFE_Y0, KNIFE_Y1);            // receive knife_B's A/B shelf
        lap_neg_Y(SEAM_KF, 0, AB_SEAM);           // receive fork_A's chamber shelf
        hinge_groove(); divider_lower(); lid_scallop();   // lid cuts (groove hits A pieces; divider/scallop where present)
    }
}

module knife_B() {
    difference() {
        union() {
            intersection() {
                box();
                union() {
                    cell(AB_SEAM, TOTAL_LEN + 1, KNIFE_Y0 - 1, KNIFE_Y1);
                    ch_key(SEAM_KF, ENDC_B);
                    ch_cap(SEAM_KF, ENDC_B);                // hide top (male, chamber)
                }
            }
            lap_shelf_X(KNIFE_Y0, KNIFE_Y1 - LAP_LEN);  // A/B shelf -> knife_A (CLIPPED at y=81 crossing)
            intersection() { lid_ledge(); cell(AB_SEAM, TOTAL_LEN + 1, KNIFE_Y0 - 1, KNIFE_Y1); }  // lid support ledge
        }
        ab_socket(YC_OUTL); ab_socket(YC_DIVKF);
        ab_cap_neg(YC_OUTL); ab_cap_neg(YC_DIVKF);      // top recesses to receive knife_A's caps (female)
        lap_neg_Y(SEAM_KF, AB_SEAM, TOTAL_LEN);         // receive fork_B's chamber shelf
        hinge_groove(); divider_lower(); lid_scallop();   // lid cuts
    }
}

module fork_A() {
    difference() {
        union() {
            intersection() {
                box();
                union() {
                    cell(-1, AB_SEAM, FORK_Y0 + SEAM_EPS, FORK_Y1);  // -Y cut nudged off the divider face
                    ab_key(YC_DIVFS); ch_key(SEAM_FS, ENDC_A);
                    ab_cap(YC_DIVFS); ch_cap(SEAM_FS, ENDC_A);       // hide tops (male)
                }
            }
            lap_shelf_Y(SEAM_KF, 0, AB_SEAM);           // chamber shelf -> knife_A (owns crossing)
            intersection() { lid_ledge(); cell(-1, AB_SEAM, FORK_Y0 + SEAM_EPS, FORK_Y1); }  // lid support ledge (none in fork-A)
        }
        lap_neg_X(FORK_Y0, FORK_Y1);                    // receive fork_B's A/B shelf
        ch_socket(SEAM_KF, ENDC_A);
        ch_cap_neg(SEAM_KF, ENDC_A);                    // top recess to receive knife_A's chamber cap (female)
        lap_neg_Y(SEAM_FS, 0, AB_SEAM, LAP_LEN_FS);     // receive spoon_A's (small) chamber shelf
        hinge_groove(); divider_lower(); lid_scallop();   // lid cuts (groove = fork-A hinge segment; divider = DIV_FS)
    }
}

module fork_B() {
    union() {
        difference() {
            union() {
                intersection() {
                    box();
                    union() {
                        cell(AB_SEAM, TOTAL_LEN + 1, FORK_Y0 + SEAM_EPS, FORK_Y1);  // -Y cut nudged off the divider face
                        ch_key(SEAM_FS, ENDC_B);
                        ch_cap(SEAM_FS, ENDC_B);                // hide top (male, chamber)
                    }
                }
                lap_shelf_X(FORK_Y0, FORK_Y1 - LAP_LEN_FS); // A/B shelf -> fork_A (CLIPPED at y=186 crossing)
                lap_shelf_Y(SEAM_KF, AB_SEAM, TOTAL_LEN);   // chamber shelf -> knife_B
                intersection() { lid_ledge(); cell(AB_SEAM, TOTAL_LEN + 1, FORK_Y0 + SEAM_EPS, FORK_Y1); }  // lid ledge (clip-end run)
            }
            ab_socket(YC_DIVFS);
            ab_cap_neg(YC_DIVFS);                           // top recess to receive fork_A's A/B cap (female)
            ch_socket(SEAM_KF, ENDC_B);
            ch_cap_neg(SEAM_KF, ENDC_B);                    // top recess to receive knife_B's chamber cap (female)
            lap_neg_Y(SEAM_FS, AB_SEAM, TOTAL_LEN, LAP_LEN_FS); // receive spoon_B's (small) chamber shelf
            hinge_groove(); divider_lower(); lid_scallop();     // lid cuts (scallop lands here)
        }
        intersection() { lid_clip(); cell(AB_SEAM, TOTAL_LEN + 1, FORK_Y0 + SEAM_EPS, FORK_Y1); }  // retaining clip, added AFTER the scallop cut
    }
}

module spoon_A() {
    difference() {
        union() {
            intersection() {
                box();
                union() {
                    cell(-1, AB_SEAM, SPOON_Y0 + SEAM_EPS, SPOON_Y1 + 1);  // -Y cut nudged off the divider face
                    ab_key(YC_OUTR);
                    ab_cap(YC_OUTR);                        // hide top (male)
                }
            }
            lap_shelf_Y(SEAM_FS, 0, AB_SEAM, LAP_LEN_FS); // chamber shelf -> fork_A (small; owns crossing)
            intersection() { lid_ledge(); cell(-1, AB_SEAM, SPOON_Y0 + SEAM_EPS, SPOON_Y1 + 1); }  // lid support ledge (OUTER_R run)
        }
        lap_neg_X(SPOON_Y0, SPOON_Y1);                  // receive spoon_B's A/B shelf
        ch_socket(SEAM_FS, ENDC_A);
        ch_cap_neg(SEAM_FS, ENDC_A);                    // top recess to receive fork_A's chamber cap (female)
        hinge_groove(); divider_lower(); lid_scallop();   // lid cuts (groove = spoon-A hinge segment)
    }
}

module spoon_B() {                                      // placed FIRST; owns shelves
    difference() {
        union() {
            intersection() {
                box();
                union() {
                    cell(AB_SEAM, TOTAL_LEN + 1, SPOON_Y0 + SEAM_EPS, SPOON_Y1 + 1);  // -Y cut nudged off the divider face
                }
            }
            lap_shelf_X(SPOON_Y0, SPOON_Y1);            // A/B shelf -> spoon_A
            lap_shelf_Y(SEAM_FS, AB_SEAM, TOTAL_LEN, LAP_LEN_FS); // chamber shelf -> fork_B (small)
            intersection() { lid_ledge(); cell(AB_SEAM, TOTAL_LEN + 1, SPOON_Y0 + SEAM_EPS, SPOON_Y1 + 1); }  // lid ledge (OUTER_R + clip-end runs)
        }
        ab_socket(YC_OUTR);
        ab_cap_neg(YC_OUTR);                            // top recess to receive spoon_A's A/B cap (female)
        ch_socket(SEAM_FS, ENDC_B);
        ch_cap_neg(SEAM_FS, ENDC_B);                    // top recess to receive fork_B's chamber cap (female)
        hinge_groove(); divider_lower(); lid_scallop();   // lid cuts
    }
}

// Fast preview: the full continuous-chamfer box (no cuts). The six part modules
// above are the real, separable pieces. To instead see the TRUE assembled
// pieces with their joints (slower — 6 booleans), replace box(); below with:
//   knife_A(); knife_B(); fork_A(); fork_B(); spoon_A(); spoon_B();
module assembly() {
    box();
}

// ============================================================================
// Render dispatch
// ============================================================================
if      (part == "knife_A")  knife_A();
else if (part == "knife_B")  knife_B();
else if (part == "fork_A")   fork_A();
else if (part == "fork_B")   fork_B();
else if (part == "spoon_A")  spoon_A();
else if (part == "spoon_B")  spoon_B();
else if (part == "assembly") assembly();
else echo(str("Unknown part: ", part));
